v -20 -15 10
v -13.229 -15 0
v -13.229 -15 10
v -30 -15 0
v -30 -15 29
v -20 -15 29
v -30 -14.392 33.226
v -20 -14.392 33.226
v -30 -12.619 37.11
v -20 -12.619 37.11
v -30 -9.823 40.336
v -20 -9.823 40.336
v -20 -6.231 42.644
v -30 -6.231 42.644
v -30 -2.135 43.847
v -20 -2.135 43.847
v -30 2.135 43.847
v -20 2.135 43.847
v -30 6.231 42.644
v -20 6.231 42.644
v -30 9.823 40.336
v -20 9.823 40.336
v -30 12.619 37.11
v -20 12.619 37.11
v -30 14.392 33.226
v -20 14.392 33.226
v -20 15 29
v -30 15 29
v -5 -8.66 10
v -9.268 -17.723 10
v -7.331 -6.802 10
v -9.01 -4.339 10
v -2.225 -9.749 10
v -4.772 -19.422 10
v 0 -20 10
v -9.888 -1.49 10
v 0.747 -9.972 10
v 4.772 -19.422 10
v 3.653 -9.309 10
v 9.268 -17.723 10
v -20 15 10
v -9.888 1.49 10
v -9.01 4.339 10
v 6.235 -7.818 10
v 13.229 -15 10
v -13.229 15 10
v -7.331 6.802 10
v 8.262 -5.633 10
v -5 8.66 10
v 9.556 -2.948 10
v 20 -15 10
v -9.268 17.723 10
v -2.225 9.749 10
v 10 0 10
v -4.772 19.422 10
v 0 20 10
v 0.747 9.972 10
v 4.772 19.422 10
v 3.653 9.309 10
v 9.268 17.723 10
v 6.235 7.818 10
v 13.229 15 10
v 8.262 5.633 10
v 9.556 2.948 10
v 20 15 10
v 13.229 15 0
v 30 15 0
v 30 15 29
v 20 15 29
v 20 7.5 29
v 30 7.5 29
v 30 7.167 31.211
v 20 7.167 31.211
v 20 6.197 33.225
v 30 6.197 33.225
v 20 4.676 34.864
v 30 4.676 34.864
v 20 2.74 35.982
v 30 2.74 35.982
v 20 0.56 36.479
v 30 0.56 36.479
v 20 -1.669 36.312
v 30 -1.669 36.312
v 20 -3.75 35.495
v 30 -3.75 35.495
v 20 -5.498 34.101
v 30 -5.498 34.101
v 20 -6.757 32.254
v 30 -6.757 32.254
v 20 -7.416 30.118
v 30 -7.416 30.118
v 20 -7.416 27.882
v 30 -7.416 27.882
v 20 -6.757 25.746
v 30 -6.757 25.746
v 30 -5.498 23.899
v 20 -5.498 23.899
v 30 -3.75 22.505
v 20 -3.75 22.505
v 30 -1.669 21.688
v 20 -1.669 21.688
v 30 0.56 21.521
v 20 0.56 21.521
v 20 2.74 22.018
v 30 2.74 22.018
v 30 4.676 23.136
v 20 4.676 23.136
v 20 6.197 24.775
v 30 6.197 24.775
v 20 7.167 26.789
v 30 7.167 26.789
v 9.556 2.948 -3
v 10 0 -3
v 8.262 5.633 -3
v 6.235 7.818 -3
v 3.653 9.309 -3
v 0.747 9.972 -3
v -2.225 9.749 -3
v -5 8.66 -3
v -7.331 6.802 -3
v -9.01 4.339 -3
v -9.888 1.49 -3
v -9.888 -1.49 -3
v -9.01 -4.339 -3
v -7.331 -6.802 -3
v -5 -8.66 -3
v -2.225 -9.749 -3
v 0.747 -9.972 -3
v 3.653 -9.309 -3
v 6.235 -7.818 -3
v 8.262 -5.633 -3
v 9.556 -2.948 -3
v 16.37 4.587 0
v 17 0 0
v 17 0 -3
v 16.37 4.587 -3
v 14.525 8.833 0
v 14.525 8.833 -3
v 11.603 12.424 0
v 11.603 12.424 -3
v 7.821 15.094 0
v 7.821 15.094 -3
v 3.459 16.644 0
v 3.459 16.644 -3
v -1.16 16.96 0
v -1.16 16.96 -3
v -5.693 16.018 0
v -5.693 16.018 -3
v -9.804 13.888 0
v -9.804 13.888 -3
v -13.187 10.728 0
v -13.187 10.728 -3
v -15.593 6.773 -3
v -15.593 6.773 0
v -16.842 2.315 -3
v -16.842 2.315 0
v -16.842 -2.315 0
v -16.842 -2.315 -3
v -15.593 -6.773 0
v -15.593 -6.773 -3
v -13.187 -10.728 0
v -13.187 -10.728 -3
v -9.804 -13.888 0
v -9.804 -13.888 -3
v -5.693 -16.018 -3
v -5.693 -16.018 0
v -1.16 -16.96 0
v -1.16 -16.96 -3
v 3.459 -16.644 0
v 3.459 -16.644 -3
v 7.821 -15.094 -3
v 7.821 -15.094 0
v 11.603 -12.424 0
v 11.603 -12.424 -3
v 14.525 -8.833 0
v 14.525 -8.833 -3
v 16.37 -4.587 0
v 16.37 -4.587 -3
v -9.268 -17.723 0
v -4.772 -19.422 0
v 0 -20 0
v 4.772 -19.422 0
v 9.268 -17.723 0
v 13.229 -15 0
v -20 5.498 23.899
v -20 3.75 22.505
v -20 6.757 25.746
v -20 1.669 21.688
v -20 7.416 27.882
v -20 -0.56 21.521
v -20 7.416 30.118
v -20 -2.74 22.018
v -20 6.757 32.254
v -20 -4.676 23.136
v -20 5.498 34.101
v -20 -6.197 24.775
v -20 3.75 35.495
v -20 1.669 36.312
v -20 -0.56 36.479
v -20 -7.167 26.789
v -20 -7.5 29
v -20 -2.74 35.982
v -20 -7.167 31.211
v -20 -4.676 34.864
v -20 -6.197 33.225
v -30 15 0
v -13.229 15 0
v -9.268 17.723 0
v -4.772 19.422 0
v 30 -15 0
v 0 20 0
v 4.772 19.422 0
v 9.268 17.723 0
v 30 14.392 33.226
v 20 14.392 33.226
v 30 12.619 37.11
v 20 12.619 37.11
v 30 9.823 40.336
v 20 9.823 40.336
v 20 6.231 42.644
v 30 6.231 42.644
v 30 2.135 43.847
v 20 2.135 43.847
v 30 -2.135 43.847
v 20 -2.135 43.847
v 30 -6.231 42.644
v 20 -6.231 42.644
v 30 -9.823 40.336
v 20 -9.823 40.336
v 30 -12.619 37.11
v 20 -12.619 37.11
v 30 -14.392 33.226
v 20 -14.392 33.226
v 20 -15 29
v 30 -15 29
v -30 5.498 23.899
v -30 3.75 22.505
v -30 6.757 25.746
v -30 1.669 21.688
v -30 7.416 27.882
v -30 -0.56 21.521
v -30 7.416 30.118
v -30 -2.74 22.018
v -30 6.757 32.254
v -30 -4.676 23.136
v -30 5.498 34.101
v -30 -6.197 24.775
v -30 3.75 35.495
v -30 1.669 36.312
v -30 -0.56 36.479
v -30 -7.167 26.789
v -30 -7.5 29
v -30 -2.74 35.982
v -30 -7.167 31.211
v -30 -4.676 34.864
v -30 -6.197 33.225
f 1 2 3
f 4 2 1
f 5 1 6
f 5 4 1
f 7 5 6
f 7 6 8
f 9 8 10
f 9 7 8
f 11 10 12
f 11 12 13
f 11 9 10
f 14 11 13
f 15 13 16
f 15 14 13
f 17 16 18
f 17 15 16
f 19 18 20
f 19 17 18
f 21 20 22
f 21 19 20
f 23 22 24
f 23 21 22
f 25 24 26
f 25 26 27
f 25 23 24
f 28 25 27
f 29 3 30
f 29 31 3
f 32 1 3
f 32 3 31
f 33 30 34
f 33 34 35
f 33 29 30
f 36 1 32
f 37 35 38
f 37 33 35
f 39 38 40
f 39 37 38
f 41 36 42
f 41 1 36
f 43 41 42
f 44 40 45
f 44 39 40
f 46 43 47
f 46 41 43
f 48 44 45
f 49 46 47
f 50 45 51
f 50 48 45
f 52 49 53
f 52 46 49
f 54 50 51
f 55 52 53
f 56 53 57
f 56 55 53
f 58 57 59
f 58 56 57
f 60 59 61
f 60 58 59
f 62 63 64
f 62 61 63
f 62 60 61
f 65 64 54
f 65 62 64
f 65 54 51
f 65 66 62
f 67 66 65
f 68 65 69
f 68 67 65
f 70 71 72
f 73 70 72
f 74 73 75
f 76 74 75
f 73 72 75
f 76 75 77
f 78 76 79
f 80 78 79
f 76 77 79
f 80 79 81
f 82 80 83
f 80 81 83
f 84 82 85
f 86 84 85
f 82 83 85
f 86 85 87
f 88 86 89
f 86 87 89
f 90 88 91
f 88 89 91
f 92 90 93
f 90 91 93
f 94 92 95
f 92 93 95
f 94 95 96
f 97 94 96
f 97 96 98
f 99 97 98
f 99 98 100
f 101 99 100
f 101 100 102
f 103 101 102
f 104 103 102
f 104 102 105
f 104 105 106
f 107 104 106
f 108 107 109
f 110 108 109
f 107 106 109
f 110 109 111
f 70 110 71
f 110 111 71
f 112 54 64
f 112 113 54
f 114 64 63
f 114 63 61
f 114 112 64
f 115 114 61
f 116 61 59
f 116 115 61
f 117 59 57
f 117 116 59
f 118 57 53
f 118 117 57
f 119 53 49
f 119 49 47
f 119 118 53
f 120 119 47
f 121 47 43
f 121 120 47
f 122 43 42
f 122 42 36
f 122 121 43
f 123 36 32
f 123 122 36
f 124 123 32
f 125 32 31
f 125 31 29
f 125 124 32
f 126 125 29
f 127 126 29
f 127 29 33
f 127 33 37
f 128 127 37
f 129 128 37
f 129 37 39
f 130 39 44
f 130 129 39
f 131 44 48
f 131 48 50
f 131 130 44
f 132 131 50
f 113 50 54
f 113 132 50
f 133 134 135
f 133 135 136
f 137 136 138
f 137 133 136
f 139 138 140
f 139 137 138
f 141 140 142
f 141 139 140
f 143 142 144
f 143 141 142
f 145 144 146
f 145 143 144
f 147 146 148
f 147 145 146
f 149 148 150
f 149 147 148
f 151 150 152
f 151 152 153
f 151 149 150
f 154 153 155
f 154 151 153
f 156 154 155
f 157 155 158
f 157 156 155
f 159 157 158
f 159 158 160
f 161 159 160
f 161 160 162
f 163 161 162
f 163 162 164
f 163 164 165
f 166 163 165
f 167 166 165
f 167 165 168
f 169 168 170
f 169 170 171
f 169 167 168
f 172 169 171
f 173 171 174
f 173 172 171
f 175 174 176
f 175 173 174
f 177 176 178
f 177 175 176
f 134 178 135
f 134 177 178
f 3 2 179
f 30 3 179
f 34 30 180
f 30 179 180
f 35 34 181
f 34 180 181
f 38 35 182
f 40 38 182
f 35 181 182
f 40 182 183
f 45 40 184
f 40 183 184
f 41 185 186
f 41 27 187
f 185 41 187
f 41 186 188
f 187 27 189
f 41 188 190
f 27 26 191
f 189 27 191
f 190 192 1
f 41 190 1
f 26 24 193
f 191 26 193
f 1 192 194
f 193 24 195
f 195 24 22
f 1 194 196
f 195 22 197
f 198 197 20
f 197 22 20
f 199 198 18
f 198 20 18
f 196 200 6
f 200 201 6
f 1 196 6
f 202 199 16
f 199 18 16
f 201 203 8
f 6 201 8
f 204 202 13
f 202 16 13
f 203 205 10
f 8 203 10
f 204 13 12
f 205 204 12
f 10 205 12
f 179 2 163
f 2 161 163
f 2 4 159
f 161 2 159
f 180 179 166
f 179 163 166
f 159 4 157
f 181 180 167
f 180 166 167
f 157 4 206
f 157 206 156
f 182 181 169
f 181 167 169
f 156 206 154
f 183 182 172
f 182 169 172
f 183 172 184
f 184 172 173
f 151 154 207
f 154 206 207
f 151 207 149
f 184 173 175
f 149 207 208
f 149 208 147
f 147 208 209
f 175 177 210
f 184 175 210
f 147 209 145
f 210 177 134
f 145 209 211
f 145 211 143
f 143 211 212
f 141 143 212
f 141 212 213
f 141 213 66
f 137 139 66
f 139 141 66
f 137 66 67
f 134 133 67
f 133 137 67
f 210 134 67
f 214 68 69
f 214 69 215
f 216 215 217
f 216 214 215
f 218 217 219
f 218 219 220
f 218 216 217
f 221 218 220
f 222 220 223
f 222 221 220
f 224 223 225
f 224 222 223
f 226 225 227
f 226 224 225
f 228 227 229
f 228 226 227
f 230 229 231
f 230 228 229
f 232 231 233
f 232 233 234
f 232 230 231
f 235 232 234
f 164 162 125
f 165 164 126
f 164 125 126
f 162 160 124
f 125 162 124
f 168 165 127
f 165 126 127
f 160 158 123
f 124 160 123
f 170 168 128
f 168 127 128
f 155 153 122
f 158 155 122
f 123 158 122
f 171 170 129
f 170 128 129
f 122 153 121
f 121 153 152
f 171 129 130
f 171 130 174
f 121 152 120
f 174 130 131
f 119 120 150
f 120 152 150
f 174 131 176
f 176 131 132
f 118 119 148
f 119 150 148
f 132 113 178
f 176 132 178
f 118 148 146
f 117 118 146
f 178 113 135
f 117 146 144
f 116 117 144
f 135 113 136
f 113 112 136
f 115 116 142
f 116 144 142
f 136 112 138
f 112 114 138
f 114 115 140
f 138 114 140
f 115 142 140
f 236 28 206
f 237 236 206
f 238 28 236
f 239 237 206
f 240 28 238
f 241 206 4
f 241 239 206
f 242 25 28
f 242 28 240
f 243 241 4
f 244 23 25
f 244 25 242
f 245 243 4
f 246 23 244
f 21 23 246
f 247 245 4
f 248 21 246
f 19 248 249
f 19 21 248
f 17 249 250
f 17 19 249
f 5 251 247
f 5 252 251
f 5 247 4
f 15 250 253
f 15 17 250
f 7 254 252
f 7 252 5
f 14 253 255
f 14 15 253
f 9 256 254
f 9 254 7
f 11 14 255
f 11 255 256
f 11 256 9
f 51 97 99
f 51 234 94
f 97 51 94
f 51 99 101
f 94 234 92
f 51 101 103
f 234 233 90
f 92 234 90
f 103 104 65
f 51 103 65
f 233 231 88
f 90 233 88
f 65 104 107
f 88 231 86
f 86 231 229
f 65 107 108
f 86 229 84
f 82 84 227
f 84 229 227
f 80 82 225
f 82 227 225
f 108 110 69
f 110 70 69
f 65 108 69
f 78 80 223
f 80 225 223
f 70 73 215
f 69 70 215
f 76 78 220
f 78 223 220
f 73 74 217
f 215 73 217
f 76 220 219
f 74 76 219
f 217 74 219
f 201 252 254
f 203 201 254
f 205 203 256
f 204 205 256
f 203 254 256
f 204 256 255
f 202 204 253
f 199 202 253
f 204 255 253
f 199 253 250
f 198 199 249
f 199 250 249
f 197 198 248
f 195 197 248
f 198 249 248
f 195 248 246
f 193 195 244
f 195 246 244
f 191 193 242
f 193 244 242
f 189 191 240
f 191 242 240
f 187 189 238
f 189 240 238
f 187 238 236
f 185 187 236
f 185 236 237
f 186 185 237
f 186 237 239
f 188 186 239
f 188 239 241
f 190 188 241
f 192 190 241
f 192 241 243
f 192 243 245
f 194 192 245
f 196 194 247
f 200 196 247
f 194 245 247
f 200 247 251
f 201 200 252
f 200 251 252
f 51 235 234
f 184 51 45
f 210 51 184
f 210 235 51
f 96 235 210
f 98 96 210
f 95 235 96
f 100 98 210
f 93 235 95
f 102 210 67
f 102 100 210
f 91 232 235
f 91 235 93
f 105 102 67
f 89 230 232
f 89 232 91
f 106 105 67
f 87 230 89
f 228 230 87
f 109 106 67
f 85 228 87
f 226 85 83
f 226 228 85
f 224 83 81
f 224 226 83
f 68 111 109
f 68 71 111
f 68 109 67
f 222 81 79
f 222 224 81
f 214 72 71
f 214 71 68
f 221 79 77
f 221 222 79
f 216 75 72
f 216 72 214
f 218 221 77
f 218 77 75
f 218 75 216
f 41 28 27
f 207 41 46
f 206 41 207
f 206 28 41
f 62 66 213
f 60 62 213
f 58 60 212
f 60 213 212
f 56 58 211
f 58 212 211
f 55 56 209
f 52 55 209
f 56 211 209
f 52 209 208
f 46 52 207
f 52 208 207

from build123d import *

# Parameters (mm, degrees)
F0_R     = 10
F1_DEPTH = 10
F4_R     = 17
F4_R_2   = 10
F5_DEPTH = 3
F3_R     = 7.5
F6_DEPTH = 10
F7_R     = 7.5
F8_DEPTH = 10


with BuildPart() as f1:
    # F0 (on Top) → F1 (new body)
    with BuildSketch(Plane.XY):
        with BuildLine():
            Line((-13.2287565553, 15), (-30, 15))
            Line((-30, 15), (-30, -15))
            Line((-30, -15), (-13.2287565553, -15))
            ThreePointArc((-13.2287565553, -15), (0, -20), (13.2287565553, -15))
            Line((13.2287565553, -15), (30, -15))
            Line((30, -15), (30, 15))
            Line((30, 15), (13.2287565553, 15))
            ThreePointArc((13.2287565553, 15), (0, 20), (-13.2287565553, 15))
        make_face()
        Circle(F0_R, mode=Mode.SUBTRACT)
    extrude(amount=F1_DEPTH)

    # F4 (on Top) → F5 (join)
    with BuildSketch(Plane.XY):
        Circle(F4_R)
        Circle(F4_R_2, mode=Mode.SUBTRACT)
    extrude(amount=-F5_DEPTH)

    # F3 (on offset) → F6 (join)
    with BuildSketch(Plane.YZ.offset(30)):
        with BuildLine():
            Line((-15, 29), (-15, 0))
            Line((-15, 0), (15, 0))
            Line((15, 0), (15, 29))
            ThreePointArc((15, 29), (0, 44), (-15, 29))
        make_face()
        with Locations((0, 29)):
            Circle(F3_R, mode=Mode.SUBTRACT)
    extrude(amount=-F6_DEPTH)

    # F7 (on face) → F8 (join)
    with BuildSketch(Plane(origin=(-30, 0, 0), x_dir=(0, -1, 0), z_dir=(-1, 0, 0))):
        with BuildLine():
            Line((-15, 29), (-15, 0))
            Line((-15, 0), (15, 0))
            Line((15, 0), (15, 29))
            ThreePointArc((15, 29), (0, 44), (-15, 29))
        make_face()
        with Locations((0, 29)):
            Circle(F7_R, mode=Mode.SUBTRACT)
    extrude(amount=-F8_DEPTH)


solid = f1.part
